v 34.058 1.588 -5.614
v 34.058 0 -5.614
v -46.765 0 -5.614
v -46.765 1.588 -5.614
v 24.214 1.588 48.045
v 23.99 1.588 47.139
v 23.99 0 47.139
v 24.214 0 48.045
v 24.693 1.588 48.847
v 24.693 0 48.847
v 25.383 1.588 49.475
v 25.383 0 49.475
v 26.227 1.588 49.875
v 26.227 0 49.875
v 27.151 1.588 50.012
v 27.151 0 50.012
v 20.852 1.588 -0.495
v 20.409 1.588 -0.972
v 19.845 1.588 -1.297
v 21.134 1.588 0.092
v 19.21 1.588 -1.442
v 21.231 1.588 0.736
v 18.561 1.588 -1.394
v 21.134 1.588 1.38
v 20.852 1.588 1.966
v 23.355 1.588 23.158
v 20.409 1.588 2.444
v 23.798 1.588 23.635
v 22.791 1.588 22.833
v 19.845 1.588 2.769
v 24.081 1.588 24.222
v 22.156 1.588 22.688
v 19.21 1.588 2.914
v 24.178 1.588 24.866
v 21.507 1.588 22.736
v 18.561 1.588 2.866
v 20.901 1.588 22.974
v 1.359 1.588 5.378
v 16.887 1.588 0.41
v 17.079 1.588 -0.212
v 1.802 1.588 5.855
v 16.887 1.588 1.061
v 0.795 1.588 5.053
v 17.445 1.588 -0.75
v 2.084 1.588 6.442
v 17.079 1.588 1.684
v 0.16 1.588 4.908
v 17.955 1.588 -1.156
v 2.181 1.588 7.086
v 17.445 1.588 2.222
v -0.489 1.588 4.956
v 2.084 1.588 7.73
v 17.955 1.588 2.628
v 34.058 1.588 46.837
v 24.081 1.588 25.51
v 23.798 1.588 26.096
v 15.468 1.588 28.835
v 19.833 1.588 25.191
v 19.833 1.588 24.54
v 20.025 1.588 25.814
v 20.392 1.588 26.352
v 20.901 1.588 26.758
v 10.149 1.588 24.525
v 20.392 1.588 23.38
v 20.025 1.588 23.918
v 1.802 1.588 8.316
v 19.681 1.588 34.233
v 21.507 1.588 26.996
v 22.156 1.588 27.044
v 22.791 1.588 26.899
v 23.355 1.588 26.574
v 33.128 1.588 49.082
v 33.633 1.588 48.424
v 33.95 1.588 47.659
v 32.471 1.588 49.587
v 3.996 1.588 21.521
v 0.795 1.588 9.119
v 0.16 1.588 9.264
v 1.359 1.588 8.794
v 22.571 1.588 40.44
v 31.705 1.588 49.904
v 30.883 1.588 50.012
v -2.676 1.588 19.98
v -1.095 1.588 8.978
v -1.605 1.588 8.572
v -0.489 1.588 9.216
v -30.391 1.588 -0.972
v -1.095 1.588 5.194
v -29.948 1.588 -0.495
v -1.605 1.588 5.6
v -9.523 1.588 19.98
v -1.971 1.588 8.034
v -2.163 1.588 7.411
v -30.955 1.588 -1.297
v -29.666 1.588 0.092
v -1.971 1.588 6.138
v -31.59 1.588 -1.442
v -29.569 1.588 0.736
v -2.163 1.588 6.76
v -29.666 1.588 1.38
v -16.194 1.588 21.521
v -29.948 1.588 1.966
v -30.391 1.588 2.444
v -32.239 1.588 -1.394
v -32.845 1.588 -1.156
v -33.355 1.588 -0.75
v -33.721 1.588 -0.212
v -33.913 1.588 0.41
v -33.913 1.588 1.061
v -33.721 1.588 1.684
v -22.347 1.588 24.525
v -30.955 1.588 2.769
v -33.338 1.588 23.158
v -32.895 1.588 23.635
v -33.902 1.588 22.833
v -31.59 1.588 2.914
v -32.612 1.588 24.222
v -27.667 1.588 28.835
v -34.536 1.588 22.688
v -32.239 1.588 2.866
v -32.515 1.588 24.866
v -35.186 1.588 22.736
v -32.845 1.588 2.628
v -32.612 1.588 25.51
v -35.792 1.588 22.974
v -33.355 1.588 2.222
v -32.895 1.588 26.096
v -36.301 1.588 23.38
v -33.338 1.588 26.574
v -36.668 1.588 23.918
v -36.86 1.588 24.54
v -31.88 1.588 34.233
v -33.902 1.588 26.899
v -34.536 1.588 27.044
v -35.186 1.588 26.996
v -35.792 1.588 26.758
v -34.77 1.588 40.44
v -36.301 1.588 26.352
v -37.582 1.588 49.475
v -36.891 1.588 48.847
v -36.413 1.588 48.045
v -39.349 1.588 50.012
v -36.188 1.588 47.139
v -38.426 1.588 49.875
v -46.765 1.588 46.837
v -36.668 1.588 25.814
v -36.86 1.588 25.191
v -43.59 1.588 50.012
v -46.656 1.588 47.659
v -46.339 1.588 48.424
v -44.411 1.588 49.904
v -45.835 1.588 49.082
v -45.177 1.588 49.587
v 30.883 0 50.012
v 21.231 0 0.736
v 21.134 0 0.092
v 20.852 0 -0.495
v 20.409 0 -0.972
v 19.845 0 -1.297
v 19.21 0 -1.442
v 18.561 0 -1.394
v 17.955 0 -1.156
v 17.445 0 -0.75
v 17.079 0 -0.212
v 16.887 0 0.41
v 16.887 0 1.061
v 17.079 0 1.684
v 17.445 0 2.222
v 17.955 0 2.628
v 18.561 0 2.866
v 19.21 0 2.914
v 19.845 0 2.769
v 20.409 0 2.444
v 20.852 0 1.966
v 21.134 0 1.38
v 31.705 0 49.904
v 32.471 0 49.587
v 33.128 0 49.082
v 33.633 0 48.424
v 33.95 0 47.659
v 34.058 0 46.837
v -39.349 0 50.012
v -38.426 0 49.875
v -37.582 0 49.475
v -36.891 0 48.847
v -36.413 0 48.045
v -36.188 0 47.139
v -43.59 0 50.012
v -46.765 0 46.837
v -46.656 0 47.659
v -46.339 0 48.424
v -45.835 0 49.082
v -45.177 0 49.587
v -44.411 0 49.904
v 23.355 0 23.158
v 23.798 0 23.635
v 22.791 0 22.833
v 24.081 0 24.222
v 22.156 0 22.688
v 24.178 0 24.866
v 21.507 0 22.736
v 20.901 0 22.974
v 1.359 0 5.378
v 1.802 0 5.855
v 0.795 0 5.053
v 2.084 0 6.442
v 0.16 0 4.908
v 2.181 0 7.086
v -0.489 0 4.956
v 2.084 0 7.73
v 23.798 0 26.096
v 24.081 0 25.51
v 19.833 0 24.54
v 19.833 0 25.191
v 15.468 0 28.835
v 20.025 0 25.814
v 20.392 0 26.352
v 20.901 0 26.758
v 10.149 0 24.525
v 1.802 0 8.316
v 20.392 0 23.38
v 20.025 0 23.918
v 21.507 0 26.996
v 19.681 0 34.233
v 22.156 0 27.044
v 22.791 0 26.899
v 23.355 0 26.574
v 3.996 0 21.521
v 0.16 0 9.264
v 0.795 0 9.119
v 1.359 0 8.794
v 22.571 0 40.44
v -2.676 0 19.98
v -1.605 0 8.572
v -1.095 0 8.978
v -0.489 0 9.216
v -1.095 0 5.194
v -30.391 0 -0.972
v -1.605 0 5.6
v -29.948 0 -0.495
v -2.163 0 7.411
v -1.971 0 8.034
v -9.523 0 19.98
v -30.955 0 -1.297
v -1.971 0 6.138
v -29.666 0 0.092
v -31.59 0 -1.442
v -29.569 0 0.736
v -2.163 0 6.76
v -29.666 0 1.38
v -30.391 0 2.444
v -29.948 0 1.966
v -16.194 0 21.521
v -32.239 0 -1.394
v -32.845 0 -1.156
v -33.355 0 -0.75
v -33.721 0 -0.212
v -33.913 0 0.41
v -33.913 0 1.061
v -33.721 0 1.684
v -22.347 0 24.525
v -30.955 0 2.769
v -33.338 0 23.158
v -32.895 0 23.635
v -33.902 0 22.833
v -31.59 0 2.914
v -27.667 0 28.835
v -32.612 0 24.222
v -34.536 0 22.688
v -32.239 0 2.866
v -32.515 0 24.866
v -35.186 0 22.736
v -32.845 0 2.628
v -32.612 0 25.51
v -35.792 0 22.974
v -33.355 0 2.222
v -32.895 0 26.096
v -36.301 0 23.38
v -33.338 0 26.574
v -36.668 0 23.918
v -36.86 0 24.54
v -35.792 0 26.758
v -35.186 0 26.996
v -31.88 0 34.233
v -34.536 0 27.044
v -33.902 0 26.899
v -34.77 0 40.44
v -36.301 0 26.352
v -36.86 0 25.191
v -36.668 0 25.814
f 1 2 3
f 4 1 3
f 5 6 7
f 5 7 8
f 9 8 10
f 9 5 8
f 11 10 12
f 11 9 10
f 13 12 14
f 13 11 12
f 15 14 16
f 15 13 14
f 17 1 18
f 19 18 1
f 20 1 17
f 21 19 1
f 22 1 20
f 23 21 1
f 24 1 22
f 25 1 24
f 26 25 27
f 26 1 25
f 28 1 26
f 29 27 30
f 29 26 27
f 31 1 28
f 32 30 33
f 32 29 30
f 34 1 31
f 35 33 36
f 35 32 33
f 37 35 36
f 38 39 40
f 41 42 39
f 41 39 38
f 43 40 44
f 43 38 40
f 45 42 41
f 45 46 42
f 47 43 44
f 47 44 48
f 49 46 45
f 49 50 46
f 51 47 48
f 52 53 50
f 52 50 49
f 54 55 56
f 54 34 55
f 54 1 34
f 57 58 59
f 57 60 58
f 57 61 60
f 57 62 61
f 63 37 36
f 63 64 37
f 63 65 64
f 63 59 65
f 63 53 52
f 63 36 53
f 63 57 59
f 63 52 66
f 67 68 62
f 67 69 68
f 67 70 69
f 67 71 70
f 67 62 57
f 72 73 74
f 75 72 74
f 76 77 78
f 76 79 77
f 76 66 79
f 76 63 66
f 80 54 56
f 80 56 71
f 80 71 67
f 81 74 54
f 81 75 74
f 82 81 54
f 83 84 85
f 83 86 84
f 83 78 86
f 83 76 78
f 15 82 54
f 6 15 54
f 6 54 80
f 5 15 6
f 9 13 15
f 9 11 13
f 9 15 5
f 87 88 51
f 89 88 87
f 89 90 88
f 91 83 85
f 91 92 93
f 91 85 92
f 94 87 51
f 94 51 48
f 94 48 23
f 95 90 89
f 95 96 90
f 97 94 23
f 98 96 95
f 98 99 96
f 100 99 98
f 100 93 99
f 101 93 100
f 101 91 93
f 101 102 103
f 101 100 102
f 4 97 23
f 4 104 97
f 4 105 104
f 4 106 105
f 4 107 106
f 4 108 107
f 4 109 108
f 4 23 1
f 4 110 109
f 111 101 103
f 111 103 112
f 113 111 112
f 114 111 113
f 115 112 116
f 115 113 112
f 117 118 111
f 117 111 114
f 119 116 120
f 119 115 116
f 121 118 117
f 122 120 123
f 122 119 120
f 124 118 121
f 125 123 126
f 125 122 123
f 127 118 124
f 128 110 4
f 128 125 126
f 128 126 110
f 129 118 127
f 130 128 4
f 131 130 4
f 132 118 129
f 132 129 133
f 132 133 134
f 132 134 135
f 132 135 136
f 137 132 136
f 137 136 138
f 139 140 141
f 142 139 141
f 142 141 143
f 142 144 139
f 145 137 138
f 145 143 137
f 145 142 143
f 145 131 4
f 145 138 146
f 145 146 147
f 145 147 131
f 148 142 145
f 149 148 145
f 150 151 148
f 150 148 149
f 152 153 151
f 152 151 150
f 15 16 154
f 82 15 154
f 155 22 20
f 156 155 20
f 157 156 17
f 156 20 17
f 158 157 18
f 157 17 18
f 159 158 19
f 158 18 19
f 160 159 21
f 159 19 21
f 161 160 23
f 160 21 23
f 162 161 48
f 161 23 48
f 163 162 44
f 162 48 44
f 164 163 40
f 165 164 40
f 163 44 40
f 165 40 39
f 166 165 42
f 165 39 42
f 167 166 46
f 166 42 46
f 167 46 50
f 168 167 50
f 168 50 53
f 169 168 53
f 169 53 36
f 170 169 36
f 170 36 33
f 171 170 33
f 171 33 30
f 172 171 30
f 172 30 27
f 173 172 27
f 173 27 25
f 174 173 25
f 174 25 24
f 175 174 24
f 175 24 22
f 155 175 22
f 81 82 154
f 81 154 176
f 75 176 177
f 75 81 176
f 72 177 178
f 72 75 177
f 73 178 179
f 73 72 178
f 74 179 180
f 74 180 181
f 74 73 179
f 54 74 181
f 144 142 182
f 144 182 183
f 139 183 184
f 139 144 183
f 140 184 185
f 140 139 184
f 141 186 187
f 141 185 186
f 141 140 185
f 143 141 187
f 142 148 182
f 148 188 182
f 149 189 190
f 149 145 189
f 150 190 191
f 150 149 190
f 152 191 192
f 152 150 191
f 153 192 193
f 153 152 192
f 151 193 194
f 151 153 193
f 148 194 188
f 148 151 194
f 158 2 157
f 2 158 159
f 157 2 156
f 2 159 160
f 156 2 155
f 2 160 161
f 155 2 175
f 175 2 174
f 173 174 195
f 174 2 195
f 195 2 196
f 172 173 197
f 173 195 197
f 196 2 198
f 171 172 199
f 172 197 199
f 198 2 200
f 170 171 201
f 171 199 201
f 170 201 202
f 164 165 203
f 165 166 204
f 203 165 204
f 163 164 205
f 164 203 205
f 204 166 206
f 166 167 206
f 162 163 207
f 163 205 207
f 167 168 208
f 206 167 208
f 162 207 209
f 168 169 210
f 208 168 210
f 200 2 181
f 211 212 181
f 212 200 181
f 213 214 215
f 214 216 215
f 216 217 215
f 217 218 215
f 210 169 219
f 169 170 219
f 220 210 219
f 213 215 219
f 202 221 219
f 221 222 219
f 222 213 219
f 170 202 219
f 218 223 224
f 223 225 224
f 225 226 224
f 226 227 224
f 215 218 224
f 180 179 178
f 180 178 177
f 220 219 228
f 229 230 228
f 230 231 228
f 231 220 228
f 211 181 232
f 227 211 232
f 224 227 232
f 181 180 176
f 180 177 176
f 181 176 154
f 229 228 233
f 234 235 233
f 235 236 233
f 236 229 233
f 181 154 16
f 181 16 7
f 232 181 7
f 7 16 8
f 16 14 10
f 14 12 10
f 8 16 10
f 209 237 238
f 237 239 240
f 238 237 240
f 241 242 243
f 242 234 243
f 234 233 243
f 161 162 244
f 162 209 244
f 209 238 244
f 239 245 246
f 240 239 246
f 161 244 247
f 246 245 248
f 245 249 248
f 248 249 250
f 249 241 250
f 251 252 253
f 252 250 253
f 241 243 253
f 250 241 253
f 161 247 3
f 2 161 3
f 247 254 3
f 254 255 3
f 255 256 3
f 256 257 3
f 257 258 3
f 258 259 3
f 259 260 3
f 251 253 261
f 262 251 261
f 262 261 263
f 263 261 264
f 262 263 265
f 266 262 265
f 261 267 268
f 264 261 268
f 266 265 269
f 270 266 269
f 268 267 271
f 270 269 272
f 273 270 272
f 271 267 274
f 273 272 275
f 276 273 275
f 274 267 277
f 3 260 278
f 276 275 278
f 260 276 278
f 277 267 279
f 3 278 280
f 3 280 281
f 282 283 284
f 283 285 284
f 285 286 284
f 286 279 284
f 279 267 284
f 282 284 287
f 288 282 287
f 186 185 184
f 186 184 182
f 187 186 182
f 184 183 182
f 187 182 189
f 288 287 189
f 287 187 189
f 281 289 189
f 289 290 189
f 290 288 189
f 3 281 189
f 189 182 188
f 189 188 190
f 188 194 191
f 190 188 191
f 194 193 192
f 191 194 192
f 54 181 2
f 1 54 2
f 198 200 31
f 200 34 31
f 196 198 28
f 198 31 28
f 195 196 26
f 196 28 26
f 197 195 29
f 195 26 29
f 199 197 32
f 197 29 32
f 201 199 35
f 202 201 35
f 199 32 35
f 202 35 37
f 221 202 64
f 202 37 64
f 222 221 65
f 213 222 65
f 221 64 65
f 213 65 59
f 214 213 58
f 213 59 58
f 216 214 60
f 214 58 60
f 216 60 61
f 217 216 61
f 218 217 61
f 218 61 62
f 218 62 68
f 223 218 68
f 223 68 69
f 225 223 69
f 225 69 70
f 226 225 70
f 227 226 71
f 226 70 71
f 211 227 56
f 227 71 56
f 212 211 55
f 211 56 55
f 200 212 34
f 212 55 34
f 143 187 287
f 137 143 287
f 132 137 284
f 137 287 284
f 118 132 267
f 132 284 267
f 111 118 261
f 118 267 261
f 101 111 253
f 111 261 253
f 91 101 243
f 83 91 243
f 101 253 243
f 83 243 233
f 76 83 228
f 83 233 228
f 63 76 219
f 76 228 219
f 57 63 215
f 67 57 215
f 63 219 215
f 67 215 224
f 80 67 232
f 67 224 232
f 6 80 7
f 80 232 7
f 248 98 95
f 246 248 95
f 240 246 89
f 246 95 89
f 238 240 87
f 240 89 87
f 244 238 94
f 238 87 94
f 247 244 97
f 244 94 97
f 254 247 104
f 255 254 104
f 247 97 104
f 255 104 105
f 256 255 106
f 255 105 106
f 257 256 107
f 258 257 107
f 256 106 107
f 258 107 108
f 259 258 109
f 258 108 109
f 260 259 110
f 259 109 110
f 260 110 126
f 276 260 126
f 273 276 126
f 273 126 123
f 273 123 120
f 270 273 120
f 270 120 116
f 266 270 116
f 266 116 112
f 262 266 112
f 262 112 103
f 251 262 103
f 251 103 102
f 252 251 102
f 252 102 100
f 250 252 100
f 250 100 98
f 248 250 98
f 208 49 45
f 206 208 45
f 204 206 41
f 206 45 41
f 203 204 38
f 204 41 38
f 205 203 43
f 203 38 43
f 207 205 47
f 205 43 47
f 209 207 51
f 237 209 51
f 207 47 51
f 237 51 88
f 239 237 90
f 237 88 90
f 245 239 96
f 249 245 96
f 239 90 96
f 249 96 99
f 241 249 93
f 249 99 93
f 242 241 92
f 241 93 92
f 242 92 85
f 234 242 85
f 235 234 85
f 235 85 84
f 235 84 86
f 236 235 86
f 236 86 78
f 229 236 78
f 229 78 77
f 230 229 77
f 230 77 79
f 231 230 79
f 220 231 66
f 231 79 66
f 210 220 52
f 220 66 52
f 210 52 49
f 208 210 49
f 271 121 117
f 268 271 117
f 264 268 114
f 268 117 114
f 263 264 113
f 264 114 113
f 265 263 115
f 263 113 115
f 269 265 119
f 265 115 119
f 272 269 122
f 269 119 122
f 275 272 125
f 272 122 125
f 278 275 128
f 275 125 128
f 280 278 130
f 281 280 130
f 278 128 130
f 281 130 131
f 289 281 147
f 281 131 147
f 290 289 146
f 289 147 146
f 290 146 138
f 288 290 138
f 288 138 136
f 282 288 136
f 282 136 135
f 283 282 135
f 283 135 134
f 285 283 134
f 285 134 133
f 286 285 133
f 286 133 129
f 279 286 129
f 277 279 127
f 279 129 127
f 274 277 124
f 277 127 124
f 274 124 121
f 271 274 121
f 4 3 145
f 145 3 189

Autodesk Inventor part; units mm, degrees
ref_plane "YZ Plane" through (0, 0, 0) normal (1, 0, 0) x (0, 1, 0)
ref_plane "XZ Plane" through (0, 0, 0) normal (0, 1, 0) x (-1, 0, 0)
ref_plane "XY Plane" through (0, 0, 0) normal (0, 0, 1) x (1, 0, 0)
sketch "Sketch1" plane through (0, 0, 0) normal (0, 1, 0) x (-1, 0, 0)
  line L0 (46.76465, 19.785927) -> (46.76465, -5.614073)
  line L1 (46.76465, -5.614073) -> (-34.05815, -5.614073)
  line L2 (-34.05815, -5.614073) -> (-34.05815, 19.785927)
  line L3 (-34.05815, 19.785927) -> (46.76465, -5.614073) construction
  line L4 (46.76465, 19.785927) -> (-34.05815, -5.614073) construction
  line L5 (-34.05815, 19.785927) -> (-34.05815, 50.011927)
  line L6 (46.76465, 19.785927) -> (46.76465, 50.011927)
  line L7 (46.76465, 19.785927) -> (-34.05815, 19.785927)
  line L8 (46.76465, 19.785927) -> (6.35325, 19.785927)
  line L9 (46.76465, 50.011927) -> (37.59525, 50.011927)
  line L10 (-23.87275, 50.011927) -> (-34.05815, 50.011927)
  line L11 (37.59525, 50.011927) -> (36.32525, 50.011927)
  arc A0 (-24.12675, 50.011927) -> (36.32525, 50.011927) centre (6.09925, 50.011927) ccw
  point P0 (6.35325, 7.085927)
  dimension "d11" = 80.8228
  dimension "d12" = 25.4
  dimension "d13" = 30.226
  dimension "d14" = 30.226
  dimension "d40" = 40.4114
  dimension "d46" = 60.452
sketch "Sketch1 outline for Extrusion3" plane through (0, 0, 0) normal (0, 1, 0) x (-1, 0, 0)
  line L0 (-34.05815, 50.011927) -> (-34.05815, 19.785927)
  line L1 (-24.12675, 50.011927) -> (-34.05815, 50.011927)
  arc A0 (36.32525, 50.011927) -> (-24.12675, 50.011927) centre (6.09925, 50.011927) cw
  line L2 (37.59525, 50.011927) -> (36.32525, 50.011927)
  line L3 (46.76465, 50.011927) -> (37.59525, 50.011927)
  line L4 (46.76465, 19.785927) -> (46.76465, 50.011927)
  line L5 (46.76465, -5.614073) -> (46.76465, 19.785927)
  line L6 (-34.05815, -5.614073) -> (46.76465, -5.614073)
  line L7 (-34.05815, 19.785927) -> (-34.05815, -5.614073)
extrude "Extrusion3" add sketch "Sketch1 outline for Extrusion3" along normal blind 1.5875
sketch "Sketch2" plane through (0, 1.5875, 0) normal (0, 1, 0) x (1, 0, 0)
  line L0 (34.05815, 5.614073) -> (-46.76465, 5.614073)
  line L1 (34.05815, 5.614073) -> (34.05815, -19.785927)
  line L2 (34.05815, -50.011927) -> (34.05815, 5.614073)
  line L3 (34.05815, 5.614073) -> (34.05815, -0.735927)
  line L4 (34.05815, -0.735927) -> (19.04675, -0.735927)
  circle A0 centre (19.04675, -0.735927) radius 2.1844
  line L5 (34.05815, 5.614073) -> (34.05815, -7.085927)
  line L6 (34.05815, -7.085927) -> (-0.00325, -7.085927)
  circle A1 centre (-0.00325, -7.085927) radius 2.1844
  line L7 (19.04675, -0.735927) -> (-31.75325, -0.735927)
  circle A2 centre (-31.75325, -0.735927) radius 2.1844
  arc A3 (-46.76465, -56.057127) -> (-44.93585, -57.885927) centre (-44.93585, -56.057127) ccw
  arc A4 (32.22935, -57.885927) -> (34.05815, -56.057127) centre (32.22935, -56.057127) ccw
  line L8 (34.05815, -19.785927) -> (-46.76465, -19.785927)
  line L9 (-46.76465, 5.614073) -> (-46.76465, -50.011927)
  line L10 (34.05815, -19.785927) -> (34.05815, -24.865927)
  line L11 (34.05815, -24.865927) -> (21.99315, -24.865927)
  circle A5 centre (21.99315, -24.865927) radius 2.1844
  line L12 (-46.76465, -19.785927) -> (-46.76465, -24.865927)
  line L13 (-46.76465, -24.865927) -> (-34.69965, -24.865927)
  circle A6 centre (-34.69965, -24.865927) radius 2.1844
  point P0 (0, 0)
  point P1 (-31.057127, -40.306856)
  point P2 (31.050628, -40.30613)
  point P3 (-43.267434, -44.121852)
  point P4 (30.560934, -44.122114)
  dimension "d18" = 25.4
  dimension "d19" = 6.35
  dimension "d20" = 15.0114
  dimension "d21" = 4.3688
  dimension "d22" = 12.7
  dimension "d23" = 34.0614
  dimension "d24" = 4.3688
  dimension "d25" = 50.8
  dimension "d26" = 4.3688
  dimension "d30" = 5.08
  dimension "d31" = 12.065
  dimension "d32" = 4.3688
  dimension "d33" = 5.08
  dimension "d34" = 12.065
  dimension "d35" = 4.3688
extrude "Extrusion4" cut sketch "Sketch2" against normal blind 1.5875 contours A0 L7 L4 | L4 L7 A0 | A1 | A2 | A5 | A6
fillet "Fillet2" radius 3.175 4 edges at (-46.7646, 0.7937, 50.0119) (34.0582, 0.7937, 50.0119) (-36.3252, 0.7937, 50.0119) (24.1268, 0.7937, 50.0119)
equation "\"d31\" = d34"
equation "\"BendRadius\" = Thickness"
equation "\"BendReliefWidth\" = Thickness"
equation "\"BendReliefDepth\" = 0.5 * Thickness"
equation "\"CornerReliefSize\" = 4 * Thickness"
equation "\"MinimumRemnant\" = 2 * Thickness"
equation "\"TransitionRadius\" = BendRadius"
equation "\"JacobiRadiusSize\" = BendRadius"
equation "\"GapSize\" = Thickness"
equation "\"Thickness\" = 1.5875"
properties part number "Winter-Climb-Guides" material "Polycarbonate, Clear"
